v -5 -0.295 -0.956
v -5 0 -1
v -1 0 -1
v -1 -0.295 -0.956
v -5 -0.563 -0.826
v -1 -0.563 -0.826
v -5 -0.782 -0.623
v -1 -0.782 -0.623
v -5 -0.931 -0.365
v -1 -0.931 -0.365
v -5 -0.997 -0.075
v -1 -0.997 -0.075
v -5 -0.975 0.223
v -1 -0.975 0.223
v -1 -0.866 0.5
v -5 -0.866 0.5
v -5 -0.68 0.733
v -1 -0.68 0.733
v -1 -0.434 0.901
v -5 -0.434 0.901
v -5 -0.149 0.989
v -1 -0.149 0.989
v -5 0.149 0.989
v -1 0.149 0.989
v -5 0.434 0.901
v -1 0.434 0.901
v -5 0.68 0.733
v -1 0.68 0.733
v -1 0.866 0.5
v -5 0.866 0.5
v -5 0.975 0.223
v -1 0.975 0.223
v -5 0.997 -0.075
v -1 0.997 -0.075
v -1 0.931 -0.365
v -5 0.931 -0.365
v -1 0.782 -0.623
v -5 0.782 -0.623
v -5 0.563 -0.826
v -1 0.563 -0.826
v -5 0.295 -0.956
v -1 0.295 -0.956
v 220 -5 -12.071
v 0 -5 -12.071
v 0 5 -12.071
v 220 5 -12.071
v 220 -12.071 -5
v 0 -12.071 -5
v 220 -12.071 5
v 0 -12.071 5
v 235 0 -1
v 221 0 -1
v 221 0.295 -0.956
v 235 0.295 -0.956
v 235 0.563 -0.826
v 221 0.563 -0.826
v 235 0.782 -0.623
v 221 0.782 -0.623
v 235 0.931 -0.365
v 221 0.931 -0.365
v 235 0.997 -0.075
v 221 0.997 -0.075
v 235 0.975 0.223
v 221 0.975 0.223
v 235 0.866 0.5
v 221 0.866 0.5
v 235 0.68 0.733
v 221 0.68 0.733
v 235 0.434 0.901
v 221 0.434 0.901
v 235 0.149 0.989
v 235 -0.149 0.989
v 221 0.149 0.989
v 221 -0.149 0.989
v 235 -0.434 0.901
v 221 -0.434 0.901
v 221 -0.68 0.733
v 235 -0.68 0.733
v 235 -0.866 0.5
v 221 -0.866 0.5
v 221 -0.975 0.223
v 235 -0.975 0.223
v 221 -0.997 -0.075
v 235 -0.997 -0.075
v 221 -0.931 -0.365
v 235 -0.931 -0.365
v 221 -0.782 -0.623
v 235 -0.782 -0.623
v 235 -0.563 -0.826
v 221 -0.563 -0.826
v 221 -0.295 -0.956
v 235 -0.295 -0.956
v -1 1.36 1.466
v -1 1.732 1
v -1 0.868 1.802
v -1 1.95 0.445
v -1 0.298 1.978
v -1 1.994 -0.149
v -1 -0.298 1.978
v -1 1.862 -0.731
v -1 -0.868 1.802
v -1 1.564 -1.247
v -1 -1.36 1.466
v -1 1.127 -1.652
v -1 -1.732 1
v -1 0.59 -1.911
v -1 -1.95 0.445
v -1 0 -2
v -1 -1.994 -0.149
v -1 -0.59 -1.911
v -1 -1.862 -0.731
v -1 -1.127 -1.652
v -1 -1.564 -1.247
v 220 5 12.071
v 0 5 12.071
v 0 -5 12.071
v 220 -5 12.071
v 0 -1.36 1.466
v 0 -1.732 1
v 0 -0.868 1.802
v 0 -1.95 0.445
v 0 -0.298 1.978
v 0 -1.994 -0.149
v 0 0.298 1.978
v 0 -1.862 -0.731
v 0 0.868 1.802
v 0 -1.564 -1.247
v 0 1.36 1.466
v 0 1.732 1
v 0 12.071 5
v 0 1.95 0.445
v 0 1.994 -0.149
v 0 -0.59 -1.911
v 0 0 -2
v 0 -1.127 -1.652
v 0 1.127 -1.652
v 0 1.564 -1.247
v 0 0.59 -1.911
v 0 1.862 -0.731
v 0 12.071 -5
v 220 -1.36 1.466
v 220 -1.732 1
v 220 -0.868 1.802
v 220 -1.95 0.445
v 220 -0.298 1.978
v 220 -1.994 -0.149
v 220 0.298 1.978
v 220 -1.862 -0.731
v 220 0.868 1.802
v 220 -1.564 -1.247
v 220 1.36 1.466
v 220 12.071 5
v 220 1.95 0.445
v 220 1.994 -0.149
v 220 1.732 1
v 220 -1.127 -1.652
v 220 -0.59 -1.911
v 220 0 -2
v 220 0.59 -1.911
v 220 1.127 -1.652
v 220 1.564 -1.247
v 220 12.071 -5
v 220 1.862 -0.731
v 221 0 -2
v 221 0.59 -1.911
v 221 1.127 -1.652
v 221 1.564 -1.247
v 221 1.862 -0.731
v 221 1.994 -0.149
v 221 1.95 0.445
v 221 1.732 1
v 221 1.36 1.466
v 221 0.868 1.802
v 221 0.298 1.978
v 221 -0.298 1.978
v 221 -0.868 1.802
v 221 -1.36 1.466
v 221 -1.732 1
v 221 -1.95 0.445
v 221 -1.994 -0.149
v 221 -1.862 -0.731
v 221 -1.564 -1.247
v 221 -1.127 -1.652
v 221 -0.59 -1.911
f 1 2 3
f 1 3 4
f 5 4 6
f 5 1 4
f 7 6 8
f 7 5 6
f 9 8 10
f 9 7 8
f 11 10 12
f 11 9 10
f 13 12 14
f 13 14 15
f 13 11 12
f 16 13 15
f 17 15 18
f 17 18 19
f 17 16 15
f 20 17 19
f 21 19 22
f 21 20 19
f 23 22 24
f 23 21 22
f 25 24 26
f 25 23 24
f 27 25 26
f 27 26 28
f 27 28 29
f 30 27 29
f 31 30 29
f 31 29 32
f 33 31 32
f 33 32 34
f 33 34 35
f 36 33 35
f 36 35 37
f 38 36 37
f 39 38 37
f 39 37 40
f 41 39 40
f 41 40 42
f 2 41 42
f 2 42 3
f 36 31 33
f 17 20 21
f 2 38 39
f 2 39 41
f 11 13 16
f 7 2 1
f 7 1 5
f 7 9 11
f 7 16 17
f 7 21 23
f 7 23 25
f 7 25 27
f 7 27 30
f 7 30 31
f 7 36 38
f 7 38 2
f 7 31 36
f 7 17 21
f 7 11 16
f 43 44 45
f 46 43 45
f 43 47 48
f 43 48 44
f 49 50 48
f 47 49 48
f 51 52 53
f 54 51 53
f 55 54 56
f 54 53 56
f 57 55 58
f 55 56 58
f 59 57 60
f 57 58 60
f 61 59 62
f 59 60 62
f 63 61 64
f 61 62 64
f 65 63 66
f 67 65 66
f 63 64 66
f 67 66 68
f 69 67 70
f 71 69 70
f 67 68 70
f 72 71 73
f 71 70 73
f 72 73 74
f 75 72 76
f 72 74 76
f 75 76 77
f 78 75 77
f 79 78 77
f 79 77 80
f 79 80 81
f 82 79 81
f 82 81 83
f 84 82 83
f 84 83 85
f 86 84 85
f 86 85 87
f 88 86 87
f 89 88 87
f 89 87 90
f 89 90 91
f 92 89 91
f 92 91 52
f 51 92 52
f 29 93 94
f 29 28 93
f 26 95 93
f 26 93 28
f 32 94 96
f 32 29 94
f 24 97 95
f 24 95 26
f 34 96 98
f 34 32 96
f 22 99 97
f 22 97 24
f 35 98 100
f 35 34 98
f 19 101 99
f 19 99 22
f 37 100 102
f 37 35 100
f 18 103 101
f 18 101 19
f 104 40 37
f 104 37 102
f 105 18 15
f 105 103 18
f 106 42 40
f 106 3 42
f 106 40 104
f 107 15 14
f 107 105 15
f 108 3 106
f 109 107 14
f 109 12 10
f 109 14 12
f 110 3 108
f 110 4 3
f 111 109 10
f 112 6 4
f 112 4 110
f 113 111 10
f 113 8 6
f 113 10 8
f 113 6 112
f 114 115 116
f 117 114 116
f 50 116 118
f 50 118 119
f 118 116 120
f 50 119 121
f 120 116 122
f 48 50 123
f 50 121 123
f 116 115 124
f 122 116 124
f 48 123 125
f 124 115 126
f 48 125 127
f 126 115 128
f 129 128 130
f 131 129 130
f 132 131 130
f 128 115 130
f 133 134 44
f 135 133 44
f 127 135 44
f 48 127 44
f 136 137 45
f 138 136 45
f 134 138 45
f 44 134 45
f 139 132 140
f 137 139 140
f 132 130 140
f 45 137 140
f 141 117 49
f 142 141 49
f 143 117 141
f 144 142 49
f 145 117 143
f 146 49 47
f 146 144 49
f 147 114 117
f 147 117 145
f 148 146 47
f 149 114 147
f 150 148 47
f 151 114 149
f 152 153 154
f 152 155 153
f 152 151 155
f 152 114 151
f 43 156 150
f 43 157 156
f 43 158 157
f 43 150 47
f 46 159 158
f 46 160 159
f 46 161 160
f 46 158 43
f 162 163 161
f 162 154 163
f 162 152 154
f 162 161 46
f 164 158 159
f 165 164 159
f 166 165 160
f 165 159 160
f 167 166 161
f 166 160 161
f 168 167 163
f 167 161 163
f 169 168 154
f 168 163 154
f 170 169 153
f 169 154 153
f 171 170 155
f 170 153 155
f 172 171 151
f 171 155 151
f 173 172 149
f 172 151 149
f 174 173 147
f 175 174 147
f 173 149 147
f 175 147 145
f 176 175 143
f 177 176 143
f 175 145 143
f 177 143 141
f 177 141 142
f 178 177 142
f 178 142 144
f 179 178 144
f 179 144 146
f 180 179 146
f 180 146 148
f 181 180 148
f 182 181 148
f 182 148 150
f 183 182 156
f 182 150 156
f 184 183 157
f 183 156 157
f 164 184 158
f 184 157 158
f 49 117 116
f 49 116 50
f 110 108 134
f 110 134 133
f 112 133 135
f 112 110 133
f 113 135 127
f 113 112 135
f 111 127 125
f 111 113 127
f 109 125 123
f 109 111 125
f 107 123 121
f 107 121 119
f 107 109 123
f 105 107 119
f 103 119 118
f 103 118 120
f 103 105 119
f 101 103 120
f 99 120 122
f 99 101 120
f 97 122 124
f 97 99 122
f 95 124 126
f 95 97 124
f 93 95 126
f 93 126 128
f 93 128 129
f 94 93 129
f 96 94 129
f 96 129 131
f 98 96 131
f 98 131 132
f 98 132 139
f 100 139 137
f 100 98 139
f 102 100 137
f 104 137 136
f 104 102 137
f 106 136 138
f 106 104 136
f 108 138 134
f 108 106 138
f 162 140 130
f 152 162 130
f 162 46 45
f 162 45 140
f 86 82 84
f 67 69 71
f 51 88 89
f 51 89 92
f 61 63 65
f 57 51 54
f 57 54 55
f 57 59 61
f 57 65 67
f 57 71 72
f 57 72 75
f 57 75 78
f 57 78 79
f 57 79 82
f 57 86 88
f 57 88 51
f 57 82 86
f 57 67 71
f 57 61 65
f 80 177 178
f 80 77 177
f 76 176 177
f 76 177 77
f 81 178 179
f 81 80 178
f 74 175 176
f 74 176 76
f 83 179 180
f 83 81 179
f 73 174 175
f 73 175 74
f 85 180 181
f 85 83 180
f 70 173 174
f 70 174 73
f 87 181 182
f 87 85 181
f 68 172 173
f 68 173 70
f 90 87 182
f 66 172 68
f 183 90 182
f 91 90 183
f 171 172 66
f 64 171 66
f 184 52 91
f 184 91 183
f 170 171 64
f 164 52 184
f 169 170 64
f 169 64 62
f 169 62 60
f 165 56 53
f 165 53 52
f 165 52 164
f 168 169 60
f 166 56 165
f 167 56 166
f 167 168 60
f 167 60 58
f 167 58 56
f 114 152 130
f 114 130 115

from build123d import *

# Parameters (mm, degrees)
EXTRUDE_1_DEPTH = 220
SKETCH_4_R      = 1
EXTRUDE_2_DEPTH = 15
SKETCH_5_R      = 2
EXTRUDE_3_DEPTH = 1
EXTRUDE_START   = 5
SKETCH_6_R      = 1
EXTRUDE_4_DEPTH = 5
EXTRUDE_START_2 = 1
SKETCH_7_R      = 2
EXTRUDE_5_DEPTH = 1


with BuildPart() as part:
    # 草图1 → 凸台-拉伸1 (new body)
    with BuildSketch(Plane(origin=(0, 0, 0), x_dir=(0, 0, -1), z_dir=(1, 0, 0))):
        Polygon((12.071067812, -5), (12.071067812, 5), (5, 12.071067812), (-5, 12.071067812), (-12.071067812, 5), (-12.071067812, -5), (-5, -12.071067812), (5, -12.071067812), align=None)
    extrude(amount=EXTRUDE_1_DEPTH)

    # 草图4 → 凸台-拉伸2 (add)
    with BuildSketch(Plane(origin=(220, 0, 0), x_dir=(0, 0, -1), z_dir=(1, 0, 0))):
        Circle(SKETCH_4_R)
    extrude(amount=EXTRUDE_2_DEPTH)

    # 草图5 → 凸台-拉伸3 (add)
    with BuildSketch(Plane(origin=(220, 0, 0), x_dir=(0, 0, -1), z_dir=(1, 0, 0))):
        Circle(SKETCH_5_R)
    extrude(amount=EXTRUDE_3_DEPTH)

    # 草图6 → 凸台-拉伸4 (add)
    with BuildSketch(Plane.ZY.offset(EXTRUDE_START)):
        with Locations(Location((0, 0, 0), (0, 0, 180))):
            Circle(SKETCH_6_R)
    extrude(amount=-EXTRUDE_4_DEPTH)

    # 草图7 → 凸台-拉伸5 (add)
    with BuildSketch(Plane.ZY.offset(EXTRUDE_START_2)):
        with Locations(Location((0, 0, 0), (0, 0, 180))):
            Circle(SKETCH_7_R)
    extrude(amount=-EXTRUDE_5_DEPTH)


solid = part.part
